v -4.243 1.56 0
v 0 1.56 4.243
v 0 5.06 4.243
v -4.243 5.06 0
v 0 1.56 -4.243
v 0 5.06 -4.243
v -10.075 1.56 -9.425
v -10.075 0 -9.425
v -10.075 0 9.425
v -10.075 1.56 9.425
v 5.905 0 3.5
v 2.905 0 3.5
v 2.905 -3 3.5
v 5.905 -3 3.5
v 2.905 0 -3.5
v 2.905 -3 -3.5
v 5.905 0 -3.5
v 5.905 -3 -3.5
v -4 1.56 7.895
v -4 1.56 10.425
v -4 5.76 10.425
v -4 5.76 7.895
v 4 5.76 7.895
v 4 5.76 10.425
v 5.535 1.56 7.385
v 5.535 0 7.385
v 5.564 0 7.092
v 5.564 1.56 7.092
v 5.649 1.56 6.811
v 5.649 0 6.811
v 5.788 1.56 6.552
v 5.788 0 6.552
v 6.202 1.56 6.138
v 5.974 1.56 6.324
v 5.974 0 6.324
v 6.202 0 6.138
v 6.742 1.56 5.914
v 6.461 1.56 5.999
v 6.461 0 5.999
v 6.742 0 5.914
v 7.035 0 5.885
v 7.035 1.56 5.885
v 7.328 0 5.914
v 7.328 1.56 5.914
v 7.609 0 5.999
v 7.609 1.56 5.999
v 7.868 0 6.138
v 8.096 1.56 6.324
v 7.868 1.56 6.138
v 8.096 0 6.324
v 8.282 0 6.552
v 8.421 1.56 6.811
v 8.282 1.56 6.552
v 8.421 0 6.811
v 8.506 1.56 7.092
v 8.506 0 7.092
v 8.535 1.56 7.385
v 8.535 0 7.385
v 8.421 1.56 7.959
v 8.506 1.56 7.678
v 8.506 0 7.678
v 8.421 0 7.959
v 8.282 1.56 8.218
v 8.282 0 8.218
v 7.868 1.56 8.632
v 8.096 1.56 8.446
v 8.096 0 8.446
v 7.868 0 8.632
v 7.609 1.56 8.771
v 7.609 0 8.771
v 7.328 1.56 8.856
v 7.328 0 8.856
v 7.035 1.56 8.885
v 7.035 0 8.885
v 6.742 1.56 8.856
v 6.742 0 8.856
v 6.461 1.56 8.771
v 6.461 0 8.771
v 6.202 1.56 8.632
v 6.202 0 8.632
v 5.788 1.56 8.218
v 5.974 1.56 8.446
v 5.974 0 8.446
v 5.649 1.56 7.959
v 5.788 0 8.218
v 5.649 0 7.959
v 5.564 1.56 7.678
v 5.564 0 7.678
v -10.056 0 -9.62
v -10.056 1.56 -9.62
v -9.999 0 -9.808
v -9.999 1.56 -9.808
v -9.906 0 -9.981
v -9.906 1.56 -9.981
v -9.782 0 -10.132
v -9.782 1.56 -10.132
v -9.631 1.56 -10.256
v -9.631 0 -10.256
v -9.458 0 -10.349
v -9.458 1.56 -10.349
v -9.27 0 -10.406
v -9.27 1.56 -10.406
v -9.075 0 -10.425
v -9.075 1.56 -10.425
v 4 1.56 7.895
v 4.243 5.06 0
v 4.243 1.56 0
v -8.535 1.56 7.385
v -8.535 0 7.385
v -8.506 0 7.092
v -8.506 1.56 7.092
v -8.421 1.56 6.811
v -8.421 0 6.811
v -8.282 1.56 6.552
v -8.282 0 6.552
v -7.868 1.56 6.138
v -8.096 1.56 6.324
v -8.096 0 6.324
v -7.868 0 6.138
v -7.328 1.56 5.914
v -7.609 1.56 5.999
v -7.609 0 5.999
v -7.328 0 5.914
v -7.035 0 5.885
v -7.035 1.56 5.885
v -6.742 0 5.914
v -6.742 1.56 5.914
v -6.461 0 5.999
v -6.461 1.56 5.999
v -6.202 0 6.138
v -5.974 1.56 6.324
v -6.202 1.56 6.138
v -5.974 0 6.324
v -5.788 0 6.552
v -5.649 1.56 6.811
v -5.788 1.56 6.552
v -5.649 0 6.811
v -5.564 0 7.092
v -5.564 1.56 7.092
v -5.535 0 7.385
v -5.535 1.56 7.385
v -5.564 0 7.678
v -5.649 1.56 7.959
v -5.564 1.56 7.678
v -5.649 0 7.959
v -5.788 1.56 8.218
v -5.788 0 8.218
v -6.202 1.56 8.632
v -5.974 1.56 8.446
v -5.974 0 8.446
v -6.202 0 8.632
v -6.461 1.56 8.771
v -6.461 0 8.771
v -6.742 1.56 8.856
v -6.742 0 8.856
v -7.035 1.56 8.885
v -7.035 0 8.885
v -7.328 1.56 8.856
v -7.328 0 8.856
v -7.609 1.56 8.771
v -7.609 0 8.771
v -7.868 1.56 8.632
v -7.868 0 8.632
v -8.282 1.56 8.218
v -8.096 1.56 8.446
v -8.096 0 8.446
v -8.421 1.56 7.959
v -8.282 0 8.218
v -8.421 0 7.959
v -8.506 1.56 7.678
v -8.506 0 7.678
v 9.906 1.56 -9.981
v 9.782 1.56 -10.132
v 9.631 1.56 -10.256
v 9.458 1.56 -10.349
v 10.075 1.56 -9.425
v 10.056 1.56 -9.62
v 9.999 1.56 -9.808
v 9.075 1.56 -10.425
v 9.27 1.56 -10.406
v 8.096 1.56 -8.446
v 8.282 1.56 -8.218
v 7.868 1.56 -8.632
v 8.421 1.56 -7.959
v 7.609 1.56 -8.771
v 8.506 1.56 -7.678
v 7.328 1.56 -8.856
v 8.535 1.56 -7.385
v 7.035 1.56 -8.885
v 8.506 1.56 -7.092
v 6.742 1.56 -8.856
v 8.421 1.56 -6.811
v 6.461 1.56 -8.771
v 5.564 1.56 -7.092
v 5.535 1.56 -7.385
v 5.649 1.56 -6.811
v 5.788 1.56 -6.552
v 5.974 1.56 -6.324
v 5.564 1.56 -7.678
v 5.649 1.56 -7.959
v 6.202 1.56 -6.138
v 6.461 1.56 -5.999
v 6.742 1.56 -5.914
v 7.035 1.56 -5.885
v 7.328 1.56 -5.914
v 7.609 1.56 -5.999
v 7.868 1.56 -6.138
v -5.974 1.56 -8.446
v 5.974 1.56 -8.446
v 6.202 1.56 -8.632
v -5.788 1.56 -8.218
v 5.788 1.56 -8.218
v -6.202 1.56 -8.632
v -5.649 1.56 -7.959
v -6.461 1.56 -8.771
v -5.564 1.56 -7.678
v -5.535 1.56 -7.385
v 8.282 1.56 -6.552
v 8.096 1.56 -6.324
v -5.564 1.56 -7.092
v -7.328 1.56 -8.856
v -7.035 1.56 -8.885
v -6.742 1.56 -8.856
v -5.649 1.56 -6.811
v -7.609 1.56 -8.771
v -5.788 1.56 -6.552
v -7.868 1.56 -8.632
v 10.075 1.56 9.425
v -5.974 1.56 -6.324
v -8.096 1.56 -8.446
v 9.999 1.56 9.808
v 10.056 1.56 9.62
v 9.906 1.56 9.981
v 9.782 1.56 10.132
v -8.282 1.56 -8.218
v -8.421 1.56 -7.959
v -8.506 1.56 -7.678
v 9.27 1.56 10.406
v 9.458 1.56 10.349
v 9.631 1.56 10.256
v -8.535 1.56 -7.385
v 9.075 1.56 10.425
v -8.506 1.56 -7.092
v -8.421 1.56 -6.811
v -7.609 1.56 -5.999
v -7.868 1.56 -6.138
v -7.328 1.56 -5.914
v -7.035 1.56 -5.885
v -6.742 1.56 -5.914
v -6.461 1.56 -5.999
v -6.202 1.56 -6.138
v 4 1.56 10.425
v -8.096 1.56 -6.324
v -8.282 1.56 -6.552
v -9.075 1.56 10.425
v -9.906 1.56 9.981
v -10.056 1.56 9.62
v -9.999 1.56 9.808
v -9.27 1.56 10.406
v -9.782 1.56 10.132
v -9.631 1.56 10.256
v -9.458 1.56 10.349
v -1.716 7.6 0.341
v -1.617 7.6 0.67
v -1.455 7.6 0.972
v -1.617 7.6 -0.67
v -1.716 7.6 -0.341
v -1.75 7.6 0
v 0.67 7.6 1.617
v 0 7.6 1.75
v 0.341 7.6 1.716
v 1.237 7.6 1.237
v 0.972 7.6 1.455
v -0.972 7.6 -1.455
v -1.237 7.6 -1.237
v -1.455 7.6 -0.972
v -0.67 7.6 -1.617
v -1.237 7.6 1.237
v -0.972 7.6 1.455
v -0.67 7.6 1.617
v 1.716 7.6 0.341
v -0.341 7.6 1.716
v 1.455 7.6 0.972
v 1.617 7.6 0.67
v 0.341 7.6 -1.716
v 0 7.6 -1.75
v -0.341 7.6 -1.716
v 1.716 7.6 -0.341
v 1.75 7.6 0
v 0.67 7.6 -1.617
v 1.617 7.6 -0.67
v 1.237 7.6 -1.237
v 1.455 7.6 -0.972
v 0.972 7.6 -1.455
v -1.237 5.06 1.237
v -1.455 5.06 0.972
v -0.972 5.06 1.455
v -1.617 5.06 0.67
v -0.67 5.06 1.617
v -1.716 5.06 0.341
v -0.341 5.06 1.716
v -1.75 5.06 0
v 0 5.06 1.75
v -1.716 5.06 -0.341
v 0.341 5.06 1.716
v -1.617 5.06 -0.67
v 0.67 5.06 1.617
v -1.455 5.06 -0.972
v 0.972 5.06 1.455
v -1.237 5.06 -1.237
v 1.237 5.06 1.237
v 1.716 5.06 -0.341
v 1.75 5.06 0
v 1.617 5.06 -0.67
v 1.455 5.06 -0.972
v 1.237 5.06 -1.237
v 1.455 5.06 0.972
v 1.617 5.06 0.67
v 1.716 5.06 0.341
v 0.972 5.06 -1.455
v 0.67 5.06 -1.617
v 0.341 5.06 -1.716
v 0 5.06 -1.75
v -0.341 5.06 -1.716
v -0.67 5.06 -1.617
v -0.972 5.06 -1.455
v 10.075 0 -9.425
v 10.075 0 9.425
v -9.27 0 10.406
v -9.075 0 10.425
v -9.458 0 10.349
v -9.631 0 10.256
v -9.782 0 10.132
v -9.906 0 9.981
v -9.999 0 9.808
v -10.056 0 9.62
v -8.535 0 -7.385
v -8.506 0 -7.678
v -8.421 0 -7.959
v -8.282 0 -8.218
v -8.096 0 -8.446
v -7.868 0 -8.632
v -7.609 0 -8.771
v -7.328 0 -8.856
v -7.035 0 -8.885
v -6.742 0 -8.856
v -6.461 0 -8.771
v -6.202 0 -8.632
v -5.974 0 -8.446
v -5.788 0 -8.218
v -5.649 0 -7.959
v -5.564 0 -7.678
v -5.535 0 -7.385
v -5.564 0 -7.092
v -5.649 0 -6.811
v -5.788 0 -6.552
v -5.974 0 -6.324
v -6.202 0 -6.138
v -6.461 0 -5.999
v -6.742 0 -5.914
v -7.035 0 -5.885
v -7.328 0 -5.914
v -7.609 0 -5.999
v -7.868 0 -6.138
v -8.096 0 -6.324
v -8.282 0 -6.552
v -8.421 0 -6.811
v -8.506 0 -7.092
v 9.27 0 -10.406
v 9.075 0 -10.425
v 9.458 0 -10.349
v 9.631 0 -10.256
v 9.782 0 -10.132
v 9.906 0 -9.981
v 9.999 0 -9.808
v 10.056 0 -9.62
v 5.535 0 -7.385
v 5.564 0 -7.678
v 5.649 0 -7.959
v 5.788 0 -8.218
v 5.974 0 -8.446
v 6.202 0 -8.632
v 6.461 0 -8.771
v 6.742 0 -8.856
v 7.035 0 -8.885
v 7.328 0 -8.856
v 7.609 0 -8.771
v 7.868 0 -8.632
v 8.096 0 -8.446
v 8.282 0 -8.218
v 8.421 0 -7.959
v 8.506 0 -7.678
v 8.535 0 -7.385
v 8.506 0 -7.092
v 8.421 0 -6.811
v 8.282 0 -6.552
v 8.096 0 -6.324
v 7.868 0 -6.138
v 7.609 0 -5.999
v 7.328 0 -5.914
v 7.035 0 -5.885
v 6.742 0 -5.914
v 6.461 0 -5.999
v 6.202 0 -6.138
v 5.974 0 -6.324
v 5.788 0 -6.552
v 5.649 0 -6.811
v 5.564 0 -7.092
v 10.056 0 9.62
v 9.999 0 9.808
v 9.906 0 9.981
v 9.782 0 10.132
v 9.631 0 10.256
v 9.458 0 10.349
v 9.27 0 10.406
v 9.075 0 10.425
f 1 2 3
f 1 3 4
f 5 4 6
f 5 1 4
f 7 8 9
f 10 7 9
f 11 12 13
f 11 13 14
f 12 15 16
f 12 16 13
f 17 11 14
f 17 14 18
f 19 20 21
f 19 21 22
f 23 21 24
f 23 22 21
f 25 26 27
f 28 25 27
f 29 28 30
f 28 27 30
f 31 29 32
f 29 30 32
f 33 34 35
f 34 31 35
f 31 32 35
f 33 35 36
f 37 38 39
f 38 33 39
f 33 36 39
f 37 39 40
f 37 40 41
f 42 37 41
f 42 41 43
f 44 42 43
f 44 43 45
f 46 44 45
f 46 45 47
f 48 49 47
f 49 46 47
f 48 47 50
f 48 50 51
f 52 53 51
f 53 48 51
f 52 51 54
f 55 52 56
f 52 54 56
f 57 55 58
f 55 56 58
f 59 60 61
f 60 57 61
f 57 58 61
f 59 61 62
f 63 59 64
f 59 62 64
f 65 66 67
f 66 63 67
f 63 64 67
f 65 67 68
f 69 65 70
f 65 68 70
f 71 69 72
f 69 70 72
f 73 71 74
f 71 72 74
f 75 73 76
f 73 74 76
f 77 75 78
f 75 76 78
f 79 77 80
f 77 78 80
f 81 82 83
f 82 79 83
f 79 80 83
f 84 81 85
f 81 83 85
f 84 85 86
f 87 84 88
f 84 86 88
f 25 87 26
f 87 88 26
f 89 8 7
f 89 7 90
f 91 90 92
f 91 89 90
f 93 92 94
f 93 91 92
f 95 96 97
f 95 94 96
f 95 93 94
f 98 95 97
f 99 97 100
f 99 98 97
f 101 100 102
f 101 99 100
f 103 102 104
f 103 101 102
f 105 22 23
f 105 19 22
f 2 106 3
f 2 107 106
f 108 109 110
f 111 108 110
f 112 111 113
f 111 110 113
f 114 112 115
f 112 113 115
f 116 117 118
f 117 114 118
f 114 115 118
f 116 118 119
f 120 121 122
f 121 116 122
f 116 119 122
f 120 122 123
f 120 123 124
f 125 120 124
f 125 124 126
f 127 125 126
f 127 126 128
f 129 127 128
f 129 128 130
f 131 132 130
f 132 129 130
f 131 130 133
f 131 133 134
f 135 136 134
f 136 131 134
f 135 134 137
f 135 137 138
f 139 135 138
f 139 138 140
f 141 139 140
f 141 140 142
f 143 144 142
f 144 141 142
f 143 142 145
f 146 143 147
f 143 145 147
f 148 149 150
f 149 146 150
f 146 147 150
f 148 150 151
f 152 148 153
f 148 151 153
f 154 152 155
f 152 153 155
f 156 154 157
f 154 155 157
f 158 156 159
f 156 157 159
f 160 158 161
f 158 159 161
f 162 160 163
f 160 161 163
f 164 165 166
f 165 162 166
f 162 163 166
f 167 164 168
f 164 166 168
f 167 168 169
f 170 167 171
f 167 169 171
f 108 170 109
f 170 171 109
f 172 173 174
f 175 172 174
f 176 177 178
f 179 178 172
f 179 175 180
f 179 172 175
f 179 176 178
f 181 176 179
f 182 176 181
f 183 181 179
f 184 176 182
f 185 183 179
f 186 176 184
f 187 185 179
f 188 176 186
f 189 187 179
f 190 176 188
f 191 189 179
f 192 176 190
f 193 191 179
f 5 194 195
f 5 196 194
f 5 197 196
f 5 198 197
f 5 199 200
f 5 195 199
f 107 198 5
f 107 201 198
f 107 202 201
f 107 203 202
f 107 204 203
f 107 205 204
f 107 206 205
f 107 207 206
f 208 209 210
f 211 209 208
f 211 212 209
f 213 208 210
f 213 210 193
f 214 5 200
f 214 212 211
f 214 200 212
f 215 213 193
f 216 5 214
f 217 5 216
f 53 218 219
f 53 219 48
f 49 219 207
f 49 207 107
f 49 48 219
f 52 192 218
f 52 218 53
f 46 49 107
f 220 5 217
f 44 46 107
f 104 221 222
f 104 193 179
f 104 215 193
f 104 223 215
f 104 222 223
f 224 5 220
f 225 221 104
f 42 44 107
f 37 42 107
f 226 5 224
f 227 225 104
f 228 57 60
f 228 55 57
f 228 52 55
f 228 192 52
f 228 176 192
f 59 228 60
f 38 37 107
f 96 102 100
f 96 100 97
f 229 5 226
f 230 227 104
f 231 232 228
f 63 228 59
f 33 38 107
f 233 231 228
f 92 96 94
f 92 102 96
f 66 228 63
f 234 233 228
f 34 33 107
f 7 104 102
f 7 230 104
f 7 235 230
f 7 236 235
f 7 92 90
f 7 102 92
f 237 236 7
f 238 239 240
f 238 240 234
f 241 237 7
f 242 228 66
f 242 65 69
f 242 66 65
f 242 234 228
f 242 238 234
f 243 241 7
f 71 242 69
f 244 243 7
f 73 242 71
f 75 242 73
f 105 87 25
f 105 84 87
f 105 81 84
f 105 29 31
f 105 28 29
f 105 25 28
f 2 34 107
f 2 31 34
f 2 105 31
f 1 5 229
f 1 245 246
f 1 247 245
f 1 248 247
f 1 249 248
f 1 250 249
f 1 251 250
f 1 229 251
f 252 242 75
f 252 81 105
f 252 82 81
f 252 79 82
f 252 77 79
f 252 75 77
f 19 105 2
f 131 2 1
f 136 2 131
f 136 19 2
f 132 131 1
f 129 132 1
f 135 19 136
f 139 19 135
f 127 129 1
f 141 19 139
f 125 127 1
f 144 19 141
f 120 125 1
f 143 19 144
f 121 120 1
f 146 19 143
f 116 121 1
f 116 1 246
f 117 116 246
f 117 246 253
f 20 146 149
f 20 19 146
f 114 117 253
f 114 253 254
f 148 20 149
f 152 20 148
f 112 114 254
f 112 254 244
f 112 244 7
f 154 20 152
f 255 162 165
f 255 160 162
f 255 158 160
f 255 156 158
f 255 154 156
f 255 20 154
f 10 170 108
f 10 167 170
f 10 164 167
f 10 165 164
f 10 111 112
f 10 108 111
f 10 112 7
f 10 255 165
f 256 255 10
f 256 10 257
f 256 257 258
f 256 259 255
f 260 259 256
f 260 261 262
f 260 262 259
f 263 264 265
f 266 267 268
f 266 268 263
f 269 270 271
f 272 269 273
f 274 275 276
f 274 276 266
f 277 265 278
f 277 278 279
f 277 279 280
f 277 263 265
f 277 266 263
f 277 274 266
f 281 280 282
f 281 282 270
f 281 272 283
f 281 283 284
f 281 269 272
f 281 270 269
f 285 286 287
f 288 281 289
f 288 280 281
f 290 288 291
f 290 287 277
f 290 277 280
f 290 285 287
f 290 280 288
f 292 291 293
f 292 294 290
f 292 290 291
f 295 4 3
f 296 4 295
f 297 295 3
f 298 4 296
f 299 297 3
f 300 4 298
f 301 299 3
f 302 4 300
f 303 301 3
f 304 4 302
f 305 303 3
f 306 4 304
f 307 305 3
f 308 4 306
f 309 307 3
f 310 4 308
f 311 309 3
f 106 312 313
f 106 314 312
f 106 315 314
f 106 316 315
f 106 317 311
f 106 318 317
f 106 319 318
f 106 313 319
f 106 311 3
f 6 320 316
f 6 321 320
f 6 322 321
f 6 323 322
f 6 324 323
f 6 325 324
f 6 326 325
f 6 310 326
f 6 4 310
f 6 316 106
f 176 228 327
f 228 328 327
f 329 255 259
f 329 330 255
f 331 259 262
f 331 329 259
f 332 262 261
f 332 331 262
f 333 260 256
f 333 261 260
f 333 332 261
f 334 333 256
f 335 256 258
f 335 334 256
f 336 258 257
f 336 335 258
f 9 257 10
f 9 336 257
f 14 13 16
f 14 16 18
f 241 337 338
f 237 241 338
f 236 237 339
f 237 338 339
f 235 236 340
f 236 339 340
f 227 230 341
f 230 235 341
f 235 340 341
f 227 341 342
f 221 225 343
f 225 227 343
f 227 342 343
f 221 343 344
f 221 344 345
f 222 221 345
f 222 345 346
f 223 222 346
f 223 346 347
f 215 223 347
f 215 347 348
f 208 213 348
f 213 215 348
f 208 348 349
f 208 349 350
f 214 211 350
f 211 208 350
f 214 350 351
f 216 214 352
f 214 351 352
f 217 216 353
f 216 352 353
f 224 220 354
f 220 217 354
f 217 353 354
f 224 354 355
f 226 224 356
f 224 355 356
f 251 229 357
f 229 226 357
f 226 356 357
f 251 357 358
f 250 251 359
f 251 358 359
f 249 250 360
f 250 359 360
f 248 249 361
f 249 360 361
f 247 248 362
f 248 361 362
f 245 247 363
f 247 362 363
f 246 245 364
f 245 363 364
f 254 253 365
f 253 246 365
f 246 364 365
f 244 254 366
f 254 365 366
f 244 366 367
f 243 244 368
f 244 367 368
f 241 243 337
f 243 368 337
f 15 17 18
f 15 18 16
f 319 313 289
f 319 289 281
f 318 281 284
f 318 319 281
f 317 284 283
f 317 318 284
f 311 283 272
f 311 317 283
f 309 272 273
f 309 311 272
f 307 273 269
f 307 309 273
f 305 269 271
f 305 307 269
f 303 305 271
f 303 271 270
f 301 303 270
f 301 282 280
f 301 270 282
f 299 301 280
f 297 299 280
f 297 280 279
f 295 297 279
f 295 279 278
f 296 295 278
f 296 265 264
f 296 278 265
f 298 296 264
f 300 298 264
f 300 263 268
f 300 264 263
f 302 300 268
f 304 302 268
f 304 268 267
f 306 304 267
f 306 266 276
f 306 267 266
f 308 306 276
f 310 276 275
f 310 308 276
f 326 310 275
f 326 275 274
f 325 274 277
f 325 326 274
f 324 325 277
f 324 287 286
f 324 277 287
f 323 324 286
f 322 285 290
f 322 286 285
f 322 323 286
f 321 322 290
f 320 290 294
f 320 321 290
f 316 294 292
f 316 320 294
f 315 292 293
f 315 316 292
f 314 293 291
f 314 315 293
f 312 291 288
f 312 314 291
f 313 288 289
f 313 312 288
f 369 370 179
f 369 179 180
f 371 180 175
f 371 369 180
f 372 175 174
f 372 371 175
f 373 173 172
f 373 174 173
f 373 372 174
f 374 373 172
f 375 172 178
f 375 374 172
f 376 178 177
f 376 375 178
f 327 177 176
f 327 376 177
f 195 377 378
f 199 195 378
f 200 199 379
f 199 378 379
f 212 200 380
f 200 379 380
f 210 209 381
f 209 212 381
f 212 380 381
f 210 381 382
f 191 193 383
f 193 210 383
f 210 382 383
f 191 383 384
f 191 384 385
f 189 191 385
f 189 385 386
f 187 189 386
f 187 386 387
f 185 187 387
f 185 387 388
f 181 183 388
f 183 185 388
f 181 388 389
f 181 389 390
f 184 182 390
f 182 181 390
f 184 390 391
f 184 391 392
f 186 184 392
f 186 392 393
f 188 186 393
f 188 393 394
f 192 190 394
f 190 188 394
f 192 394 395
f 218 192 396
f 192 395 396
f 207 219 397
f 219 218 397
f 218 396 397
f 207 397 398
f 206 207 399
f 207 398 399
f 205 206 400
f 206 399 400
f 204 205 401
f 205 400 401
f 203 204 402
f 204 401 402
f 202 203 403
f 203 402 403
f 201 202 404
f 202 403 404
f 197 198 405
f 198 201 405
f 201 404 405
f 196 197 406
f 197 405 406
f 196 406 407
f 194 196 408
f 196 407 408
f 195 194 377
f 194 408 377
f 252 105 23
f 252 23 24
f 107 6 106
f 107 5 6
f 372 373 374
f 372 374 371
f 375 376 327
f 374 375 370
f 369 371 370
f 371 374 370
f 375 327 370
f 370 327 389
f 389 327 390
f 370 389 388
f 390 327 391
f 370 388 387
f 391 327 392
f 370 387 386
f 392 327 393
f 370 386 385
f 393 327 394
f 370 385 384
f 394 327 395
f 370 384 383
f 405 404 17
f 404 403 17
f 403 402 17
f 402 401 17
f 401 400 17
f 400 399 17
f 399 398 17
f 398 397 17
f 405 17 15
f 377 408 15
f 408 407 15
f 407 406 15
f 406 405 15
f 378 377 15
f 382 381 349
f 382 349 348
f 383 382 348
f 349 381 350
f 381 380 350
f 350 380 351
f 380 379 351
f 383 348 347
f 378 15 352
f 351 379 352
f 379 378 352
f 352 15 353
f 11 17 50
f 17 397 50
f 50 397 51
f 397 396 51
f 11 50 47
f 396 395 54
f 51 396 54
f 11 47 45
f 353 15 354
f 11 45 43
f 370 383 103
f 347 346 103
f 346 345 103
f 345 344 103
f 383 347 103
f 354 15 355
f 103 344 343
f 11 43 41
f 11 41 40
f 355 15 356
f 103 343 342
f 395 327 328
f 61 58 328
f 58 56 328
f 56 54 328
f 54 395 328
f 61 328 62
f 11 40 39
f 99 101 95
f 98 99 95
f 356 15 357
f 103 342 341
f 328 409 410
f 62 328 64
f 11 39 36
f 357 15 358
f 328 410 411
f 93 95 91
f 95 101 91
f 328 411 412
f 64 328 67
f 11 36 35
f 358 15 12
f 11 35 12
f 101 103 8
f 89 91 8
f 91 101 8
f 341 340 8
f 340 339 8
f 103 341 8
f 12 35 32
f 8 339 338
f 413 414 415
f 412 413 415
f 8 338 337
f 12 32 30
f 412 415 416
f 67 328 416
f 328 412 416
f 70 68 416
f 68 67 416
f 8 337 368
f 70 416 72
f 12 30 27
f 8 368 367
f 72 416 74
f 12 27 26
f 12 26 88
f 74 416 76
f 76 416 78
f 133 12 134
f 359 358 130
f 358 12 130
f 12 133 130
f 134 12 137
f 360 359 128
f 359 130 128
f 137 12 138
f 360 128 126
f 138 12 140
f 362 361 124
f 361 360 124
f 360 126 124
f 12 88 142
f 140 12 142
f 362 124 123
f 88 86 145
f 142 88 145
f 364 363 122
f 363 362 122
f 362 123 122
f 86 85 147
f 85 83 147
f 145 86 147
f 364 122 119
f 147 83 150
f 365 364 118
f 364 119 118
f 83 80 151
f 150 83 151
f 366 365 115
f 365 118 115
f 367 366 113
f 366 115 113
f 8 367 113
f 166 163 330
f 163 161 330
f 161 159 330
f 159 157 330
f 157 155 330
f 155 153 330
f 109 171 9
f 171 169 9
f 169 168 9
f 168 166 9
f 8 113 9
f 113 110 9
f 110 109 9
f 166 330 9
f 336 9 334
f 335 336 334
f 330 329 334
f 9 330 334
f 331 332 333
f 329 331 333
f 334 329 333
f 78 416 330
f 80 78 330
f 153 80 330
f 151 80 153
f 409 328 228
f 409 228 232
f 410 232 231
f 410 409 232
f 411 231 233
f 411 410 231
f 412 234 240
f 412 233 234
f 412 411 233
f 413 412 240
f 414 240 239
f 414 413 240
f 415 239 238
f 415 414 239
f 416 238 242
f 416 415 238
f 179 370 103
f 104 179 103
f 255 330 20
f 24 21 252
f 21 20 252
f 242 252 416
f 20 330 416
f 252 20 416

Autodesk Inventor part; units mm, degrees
ref_plane "YZ Plane" through (0, 0, 0) normal (1, 0, 0) x (0, 1, 0)
ref_plane "XZ Plane" through (0, 0, 0) normal (0, 1, 0) x (-1, 0, 0)
ref_plane "XY Plane" through (0, 0, 0) normal (0, 0, 1) x (1, 0, 0)
sketch "Sketch1" plane through (0, 0, 0) normal (0, 1, 0) x (-1, 0, 0)
  line L0 (9.075, 10.425) -> (-9.075, 10.425)
  line L1 (-10.075, 9.425) -> (-10.075, -9.425)
  line L2 (-9.075, -10.425) -> (9.075, -10.425)
  line L3 (10.075, -9.425) -> (10.075, 9.425)
  line L4 (10.075, 10.425) -> (-10.075, -10.425) construction
  line L5 (-10.075, 10.425) -> (10.075, -10.425) construction
  arc A0 (9.075, -10.425) -> (10.075, -9.425) centre (9.075, -9.425) ccw
  arc A1 (-10.075, -9.425) -> (-9.075, -10.425) centre (-9.075, -9.425) ccw
  arc A2 (-9.075, 10.425) -> (-10.075, 9.425) centre (-9.075, 9.425) ccw
  arc A3 (10.075, 9.425) -> (9.075, 10.425) centre (9.075, 9.425) ccw
  circle A4 centre (7.035, -7.385) radius 1.5
  line L6 (10.075, 0) -> (-10.075, 0) construction
  line L7 (0, -10.425) -> (0, 10.425) construction
  circle A5 centre (7.035, 7.385) radius 1.5
  circle A6 centre (-7.035, -7.385) radius 1.5
  circle A7 centre (-7.035, 7.385) radius 1.5
  point P0 (0, 0)
  dimension "d0" = 20.15
  dimension "d1" = 20.85
  dimension "d4" = 1
  dimension "d5" = 3
  dimension "d6" = 3.04
  dimension "d7" = 3.04
extrude "Extrusion2" add sketch "Sketch1" along normal blind 1.56
sketch "Sketch2" plane through (0, 1.56, 0) normal (0, 1, 0) x (1, 0, 0)
  line L0 (-4.2426, 0) -> (0, 4.2426)
  line L1 (0, 4.2426) -> (4.2426, 0)
  line L2 (4.2426, 0) -> (0, -4.2426)
  line L3 (0, -4.2426) -> (-4.2426, 0)
  line L4 (-3, 3) -> (3, -3) construction
  line L5 (3, 3) -> (-3, -3) construction
  point P0 (0, 0)
  dimension "d10" = 6
  dimension "d11" = 6
extrude "Extrusion3" add sketch "Sketch2" along normal blind 3.5
sketch "Sketch3" plane through (0, 1.56, 0) normal (0, 1, 0) x (1, 0, 0)
  line L0 (4, -10.425) -> (-4, -10.425)
  line L1 (-4, -10.425) -> (-4, -7.895)
  line L2 (-4, -7.895) -> (4, -7.895)
  line L3 (4, -7.895) -> (4, -10.425)
  line L4 (-9.075, -10.425) -> (9.075, -10.425) construction
  line L5 (0, -10.425) -> (0, 10.4665) construction
  point P0 (0, 0)
  dimension "d14" = 8
  dimension "d15" = 2.53
extrude "Extrusion4" add sketch "Sketch3" along normal blind 4.2
sketch "Sketch4" plane through (0, 0, 0) normal (0, -1, 0) x (1, 0, 0)
  line L0 (2.9048, 3.5) -> (5.9048, 3.5)
  line L1 (5.9048, 3.5) -> (5.9048, -3.5)
  line L2 (5.9048, -3.5) -> (2.9048, -3.5)
  line L3 (2.9048, -3.5) -> (2.9048, 3.5)
  line L4 (-14.105, 0) -> (14.105, 0) projected
  point P0 (0, 0)
  point P1 (2.9048, 0)
  dimension "d18" = 3
  dimension "d19" = 7
extrude "Extrusion5" add sketch "Sketch4" along normal blind 3
sketch "Sketch5" plane through (0, 5.06, 0) normal (0, 1, 0) x (1, 0, 0)
  circle A0 centre (0, 0) radius 1.75
  dimension "d22" = 3.5
extrude "Extrusion6" add sketch "Sketch5" along normal blind 2.54
equation "\"d7\" = d6"
properties part number "board_blueprint"
